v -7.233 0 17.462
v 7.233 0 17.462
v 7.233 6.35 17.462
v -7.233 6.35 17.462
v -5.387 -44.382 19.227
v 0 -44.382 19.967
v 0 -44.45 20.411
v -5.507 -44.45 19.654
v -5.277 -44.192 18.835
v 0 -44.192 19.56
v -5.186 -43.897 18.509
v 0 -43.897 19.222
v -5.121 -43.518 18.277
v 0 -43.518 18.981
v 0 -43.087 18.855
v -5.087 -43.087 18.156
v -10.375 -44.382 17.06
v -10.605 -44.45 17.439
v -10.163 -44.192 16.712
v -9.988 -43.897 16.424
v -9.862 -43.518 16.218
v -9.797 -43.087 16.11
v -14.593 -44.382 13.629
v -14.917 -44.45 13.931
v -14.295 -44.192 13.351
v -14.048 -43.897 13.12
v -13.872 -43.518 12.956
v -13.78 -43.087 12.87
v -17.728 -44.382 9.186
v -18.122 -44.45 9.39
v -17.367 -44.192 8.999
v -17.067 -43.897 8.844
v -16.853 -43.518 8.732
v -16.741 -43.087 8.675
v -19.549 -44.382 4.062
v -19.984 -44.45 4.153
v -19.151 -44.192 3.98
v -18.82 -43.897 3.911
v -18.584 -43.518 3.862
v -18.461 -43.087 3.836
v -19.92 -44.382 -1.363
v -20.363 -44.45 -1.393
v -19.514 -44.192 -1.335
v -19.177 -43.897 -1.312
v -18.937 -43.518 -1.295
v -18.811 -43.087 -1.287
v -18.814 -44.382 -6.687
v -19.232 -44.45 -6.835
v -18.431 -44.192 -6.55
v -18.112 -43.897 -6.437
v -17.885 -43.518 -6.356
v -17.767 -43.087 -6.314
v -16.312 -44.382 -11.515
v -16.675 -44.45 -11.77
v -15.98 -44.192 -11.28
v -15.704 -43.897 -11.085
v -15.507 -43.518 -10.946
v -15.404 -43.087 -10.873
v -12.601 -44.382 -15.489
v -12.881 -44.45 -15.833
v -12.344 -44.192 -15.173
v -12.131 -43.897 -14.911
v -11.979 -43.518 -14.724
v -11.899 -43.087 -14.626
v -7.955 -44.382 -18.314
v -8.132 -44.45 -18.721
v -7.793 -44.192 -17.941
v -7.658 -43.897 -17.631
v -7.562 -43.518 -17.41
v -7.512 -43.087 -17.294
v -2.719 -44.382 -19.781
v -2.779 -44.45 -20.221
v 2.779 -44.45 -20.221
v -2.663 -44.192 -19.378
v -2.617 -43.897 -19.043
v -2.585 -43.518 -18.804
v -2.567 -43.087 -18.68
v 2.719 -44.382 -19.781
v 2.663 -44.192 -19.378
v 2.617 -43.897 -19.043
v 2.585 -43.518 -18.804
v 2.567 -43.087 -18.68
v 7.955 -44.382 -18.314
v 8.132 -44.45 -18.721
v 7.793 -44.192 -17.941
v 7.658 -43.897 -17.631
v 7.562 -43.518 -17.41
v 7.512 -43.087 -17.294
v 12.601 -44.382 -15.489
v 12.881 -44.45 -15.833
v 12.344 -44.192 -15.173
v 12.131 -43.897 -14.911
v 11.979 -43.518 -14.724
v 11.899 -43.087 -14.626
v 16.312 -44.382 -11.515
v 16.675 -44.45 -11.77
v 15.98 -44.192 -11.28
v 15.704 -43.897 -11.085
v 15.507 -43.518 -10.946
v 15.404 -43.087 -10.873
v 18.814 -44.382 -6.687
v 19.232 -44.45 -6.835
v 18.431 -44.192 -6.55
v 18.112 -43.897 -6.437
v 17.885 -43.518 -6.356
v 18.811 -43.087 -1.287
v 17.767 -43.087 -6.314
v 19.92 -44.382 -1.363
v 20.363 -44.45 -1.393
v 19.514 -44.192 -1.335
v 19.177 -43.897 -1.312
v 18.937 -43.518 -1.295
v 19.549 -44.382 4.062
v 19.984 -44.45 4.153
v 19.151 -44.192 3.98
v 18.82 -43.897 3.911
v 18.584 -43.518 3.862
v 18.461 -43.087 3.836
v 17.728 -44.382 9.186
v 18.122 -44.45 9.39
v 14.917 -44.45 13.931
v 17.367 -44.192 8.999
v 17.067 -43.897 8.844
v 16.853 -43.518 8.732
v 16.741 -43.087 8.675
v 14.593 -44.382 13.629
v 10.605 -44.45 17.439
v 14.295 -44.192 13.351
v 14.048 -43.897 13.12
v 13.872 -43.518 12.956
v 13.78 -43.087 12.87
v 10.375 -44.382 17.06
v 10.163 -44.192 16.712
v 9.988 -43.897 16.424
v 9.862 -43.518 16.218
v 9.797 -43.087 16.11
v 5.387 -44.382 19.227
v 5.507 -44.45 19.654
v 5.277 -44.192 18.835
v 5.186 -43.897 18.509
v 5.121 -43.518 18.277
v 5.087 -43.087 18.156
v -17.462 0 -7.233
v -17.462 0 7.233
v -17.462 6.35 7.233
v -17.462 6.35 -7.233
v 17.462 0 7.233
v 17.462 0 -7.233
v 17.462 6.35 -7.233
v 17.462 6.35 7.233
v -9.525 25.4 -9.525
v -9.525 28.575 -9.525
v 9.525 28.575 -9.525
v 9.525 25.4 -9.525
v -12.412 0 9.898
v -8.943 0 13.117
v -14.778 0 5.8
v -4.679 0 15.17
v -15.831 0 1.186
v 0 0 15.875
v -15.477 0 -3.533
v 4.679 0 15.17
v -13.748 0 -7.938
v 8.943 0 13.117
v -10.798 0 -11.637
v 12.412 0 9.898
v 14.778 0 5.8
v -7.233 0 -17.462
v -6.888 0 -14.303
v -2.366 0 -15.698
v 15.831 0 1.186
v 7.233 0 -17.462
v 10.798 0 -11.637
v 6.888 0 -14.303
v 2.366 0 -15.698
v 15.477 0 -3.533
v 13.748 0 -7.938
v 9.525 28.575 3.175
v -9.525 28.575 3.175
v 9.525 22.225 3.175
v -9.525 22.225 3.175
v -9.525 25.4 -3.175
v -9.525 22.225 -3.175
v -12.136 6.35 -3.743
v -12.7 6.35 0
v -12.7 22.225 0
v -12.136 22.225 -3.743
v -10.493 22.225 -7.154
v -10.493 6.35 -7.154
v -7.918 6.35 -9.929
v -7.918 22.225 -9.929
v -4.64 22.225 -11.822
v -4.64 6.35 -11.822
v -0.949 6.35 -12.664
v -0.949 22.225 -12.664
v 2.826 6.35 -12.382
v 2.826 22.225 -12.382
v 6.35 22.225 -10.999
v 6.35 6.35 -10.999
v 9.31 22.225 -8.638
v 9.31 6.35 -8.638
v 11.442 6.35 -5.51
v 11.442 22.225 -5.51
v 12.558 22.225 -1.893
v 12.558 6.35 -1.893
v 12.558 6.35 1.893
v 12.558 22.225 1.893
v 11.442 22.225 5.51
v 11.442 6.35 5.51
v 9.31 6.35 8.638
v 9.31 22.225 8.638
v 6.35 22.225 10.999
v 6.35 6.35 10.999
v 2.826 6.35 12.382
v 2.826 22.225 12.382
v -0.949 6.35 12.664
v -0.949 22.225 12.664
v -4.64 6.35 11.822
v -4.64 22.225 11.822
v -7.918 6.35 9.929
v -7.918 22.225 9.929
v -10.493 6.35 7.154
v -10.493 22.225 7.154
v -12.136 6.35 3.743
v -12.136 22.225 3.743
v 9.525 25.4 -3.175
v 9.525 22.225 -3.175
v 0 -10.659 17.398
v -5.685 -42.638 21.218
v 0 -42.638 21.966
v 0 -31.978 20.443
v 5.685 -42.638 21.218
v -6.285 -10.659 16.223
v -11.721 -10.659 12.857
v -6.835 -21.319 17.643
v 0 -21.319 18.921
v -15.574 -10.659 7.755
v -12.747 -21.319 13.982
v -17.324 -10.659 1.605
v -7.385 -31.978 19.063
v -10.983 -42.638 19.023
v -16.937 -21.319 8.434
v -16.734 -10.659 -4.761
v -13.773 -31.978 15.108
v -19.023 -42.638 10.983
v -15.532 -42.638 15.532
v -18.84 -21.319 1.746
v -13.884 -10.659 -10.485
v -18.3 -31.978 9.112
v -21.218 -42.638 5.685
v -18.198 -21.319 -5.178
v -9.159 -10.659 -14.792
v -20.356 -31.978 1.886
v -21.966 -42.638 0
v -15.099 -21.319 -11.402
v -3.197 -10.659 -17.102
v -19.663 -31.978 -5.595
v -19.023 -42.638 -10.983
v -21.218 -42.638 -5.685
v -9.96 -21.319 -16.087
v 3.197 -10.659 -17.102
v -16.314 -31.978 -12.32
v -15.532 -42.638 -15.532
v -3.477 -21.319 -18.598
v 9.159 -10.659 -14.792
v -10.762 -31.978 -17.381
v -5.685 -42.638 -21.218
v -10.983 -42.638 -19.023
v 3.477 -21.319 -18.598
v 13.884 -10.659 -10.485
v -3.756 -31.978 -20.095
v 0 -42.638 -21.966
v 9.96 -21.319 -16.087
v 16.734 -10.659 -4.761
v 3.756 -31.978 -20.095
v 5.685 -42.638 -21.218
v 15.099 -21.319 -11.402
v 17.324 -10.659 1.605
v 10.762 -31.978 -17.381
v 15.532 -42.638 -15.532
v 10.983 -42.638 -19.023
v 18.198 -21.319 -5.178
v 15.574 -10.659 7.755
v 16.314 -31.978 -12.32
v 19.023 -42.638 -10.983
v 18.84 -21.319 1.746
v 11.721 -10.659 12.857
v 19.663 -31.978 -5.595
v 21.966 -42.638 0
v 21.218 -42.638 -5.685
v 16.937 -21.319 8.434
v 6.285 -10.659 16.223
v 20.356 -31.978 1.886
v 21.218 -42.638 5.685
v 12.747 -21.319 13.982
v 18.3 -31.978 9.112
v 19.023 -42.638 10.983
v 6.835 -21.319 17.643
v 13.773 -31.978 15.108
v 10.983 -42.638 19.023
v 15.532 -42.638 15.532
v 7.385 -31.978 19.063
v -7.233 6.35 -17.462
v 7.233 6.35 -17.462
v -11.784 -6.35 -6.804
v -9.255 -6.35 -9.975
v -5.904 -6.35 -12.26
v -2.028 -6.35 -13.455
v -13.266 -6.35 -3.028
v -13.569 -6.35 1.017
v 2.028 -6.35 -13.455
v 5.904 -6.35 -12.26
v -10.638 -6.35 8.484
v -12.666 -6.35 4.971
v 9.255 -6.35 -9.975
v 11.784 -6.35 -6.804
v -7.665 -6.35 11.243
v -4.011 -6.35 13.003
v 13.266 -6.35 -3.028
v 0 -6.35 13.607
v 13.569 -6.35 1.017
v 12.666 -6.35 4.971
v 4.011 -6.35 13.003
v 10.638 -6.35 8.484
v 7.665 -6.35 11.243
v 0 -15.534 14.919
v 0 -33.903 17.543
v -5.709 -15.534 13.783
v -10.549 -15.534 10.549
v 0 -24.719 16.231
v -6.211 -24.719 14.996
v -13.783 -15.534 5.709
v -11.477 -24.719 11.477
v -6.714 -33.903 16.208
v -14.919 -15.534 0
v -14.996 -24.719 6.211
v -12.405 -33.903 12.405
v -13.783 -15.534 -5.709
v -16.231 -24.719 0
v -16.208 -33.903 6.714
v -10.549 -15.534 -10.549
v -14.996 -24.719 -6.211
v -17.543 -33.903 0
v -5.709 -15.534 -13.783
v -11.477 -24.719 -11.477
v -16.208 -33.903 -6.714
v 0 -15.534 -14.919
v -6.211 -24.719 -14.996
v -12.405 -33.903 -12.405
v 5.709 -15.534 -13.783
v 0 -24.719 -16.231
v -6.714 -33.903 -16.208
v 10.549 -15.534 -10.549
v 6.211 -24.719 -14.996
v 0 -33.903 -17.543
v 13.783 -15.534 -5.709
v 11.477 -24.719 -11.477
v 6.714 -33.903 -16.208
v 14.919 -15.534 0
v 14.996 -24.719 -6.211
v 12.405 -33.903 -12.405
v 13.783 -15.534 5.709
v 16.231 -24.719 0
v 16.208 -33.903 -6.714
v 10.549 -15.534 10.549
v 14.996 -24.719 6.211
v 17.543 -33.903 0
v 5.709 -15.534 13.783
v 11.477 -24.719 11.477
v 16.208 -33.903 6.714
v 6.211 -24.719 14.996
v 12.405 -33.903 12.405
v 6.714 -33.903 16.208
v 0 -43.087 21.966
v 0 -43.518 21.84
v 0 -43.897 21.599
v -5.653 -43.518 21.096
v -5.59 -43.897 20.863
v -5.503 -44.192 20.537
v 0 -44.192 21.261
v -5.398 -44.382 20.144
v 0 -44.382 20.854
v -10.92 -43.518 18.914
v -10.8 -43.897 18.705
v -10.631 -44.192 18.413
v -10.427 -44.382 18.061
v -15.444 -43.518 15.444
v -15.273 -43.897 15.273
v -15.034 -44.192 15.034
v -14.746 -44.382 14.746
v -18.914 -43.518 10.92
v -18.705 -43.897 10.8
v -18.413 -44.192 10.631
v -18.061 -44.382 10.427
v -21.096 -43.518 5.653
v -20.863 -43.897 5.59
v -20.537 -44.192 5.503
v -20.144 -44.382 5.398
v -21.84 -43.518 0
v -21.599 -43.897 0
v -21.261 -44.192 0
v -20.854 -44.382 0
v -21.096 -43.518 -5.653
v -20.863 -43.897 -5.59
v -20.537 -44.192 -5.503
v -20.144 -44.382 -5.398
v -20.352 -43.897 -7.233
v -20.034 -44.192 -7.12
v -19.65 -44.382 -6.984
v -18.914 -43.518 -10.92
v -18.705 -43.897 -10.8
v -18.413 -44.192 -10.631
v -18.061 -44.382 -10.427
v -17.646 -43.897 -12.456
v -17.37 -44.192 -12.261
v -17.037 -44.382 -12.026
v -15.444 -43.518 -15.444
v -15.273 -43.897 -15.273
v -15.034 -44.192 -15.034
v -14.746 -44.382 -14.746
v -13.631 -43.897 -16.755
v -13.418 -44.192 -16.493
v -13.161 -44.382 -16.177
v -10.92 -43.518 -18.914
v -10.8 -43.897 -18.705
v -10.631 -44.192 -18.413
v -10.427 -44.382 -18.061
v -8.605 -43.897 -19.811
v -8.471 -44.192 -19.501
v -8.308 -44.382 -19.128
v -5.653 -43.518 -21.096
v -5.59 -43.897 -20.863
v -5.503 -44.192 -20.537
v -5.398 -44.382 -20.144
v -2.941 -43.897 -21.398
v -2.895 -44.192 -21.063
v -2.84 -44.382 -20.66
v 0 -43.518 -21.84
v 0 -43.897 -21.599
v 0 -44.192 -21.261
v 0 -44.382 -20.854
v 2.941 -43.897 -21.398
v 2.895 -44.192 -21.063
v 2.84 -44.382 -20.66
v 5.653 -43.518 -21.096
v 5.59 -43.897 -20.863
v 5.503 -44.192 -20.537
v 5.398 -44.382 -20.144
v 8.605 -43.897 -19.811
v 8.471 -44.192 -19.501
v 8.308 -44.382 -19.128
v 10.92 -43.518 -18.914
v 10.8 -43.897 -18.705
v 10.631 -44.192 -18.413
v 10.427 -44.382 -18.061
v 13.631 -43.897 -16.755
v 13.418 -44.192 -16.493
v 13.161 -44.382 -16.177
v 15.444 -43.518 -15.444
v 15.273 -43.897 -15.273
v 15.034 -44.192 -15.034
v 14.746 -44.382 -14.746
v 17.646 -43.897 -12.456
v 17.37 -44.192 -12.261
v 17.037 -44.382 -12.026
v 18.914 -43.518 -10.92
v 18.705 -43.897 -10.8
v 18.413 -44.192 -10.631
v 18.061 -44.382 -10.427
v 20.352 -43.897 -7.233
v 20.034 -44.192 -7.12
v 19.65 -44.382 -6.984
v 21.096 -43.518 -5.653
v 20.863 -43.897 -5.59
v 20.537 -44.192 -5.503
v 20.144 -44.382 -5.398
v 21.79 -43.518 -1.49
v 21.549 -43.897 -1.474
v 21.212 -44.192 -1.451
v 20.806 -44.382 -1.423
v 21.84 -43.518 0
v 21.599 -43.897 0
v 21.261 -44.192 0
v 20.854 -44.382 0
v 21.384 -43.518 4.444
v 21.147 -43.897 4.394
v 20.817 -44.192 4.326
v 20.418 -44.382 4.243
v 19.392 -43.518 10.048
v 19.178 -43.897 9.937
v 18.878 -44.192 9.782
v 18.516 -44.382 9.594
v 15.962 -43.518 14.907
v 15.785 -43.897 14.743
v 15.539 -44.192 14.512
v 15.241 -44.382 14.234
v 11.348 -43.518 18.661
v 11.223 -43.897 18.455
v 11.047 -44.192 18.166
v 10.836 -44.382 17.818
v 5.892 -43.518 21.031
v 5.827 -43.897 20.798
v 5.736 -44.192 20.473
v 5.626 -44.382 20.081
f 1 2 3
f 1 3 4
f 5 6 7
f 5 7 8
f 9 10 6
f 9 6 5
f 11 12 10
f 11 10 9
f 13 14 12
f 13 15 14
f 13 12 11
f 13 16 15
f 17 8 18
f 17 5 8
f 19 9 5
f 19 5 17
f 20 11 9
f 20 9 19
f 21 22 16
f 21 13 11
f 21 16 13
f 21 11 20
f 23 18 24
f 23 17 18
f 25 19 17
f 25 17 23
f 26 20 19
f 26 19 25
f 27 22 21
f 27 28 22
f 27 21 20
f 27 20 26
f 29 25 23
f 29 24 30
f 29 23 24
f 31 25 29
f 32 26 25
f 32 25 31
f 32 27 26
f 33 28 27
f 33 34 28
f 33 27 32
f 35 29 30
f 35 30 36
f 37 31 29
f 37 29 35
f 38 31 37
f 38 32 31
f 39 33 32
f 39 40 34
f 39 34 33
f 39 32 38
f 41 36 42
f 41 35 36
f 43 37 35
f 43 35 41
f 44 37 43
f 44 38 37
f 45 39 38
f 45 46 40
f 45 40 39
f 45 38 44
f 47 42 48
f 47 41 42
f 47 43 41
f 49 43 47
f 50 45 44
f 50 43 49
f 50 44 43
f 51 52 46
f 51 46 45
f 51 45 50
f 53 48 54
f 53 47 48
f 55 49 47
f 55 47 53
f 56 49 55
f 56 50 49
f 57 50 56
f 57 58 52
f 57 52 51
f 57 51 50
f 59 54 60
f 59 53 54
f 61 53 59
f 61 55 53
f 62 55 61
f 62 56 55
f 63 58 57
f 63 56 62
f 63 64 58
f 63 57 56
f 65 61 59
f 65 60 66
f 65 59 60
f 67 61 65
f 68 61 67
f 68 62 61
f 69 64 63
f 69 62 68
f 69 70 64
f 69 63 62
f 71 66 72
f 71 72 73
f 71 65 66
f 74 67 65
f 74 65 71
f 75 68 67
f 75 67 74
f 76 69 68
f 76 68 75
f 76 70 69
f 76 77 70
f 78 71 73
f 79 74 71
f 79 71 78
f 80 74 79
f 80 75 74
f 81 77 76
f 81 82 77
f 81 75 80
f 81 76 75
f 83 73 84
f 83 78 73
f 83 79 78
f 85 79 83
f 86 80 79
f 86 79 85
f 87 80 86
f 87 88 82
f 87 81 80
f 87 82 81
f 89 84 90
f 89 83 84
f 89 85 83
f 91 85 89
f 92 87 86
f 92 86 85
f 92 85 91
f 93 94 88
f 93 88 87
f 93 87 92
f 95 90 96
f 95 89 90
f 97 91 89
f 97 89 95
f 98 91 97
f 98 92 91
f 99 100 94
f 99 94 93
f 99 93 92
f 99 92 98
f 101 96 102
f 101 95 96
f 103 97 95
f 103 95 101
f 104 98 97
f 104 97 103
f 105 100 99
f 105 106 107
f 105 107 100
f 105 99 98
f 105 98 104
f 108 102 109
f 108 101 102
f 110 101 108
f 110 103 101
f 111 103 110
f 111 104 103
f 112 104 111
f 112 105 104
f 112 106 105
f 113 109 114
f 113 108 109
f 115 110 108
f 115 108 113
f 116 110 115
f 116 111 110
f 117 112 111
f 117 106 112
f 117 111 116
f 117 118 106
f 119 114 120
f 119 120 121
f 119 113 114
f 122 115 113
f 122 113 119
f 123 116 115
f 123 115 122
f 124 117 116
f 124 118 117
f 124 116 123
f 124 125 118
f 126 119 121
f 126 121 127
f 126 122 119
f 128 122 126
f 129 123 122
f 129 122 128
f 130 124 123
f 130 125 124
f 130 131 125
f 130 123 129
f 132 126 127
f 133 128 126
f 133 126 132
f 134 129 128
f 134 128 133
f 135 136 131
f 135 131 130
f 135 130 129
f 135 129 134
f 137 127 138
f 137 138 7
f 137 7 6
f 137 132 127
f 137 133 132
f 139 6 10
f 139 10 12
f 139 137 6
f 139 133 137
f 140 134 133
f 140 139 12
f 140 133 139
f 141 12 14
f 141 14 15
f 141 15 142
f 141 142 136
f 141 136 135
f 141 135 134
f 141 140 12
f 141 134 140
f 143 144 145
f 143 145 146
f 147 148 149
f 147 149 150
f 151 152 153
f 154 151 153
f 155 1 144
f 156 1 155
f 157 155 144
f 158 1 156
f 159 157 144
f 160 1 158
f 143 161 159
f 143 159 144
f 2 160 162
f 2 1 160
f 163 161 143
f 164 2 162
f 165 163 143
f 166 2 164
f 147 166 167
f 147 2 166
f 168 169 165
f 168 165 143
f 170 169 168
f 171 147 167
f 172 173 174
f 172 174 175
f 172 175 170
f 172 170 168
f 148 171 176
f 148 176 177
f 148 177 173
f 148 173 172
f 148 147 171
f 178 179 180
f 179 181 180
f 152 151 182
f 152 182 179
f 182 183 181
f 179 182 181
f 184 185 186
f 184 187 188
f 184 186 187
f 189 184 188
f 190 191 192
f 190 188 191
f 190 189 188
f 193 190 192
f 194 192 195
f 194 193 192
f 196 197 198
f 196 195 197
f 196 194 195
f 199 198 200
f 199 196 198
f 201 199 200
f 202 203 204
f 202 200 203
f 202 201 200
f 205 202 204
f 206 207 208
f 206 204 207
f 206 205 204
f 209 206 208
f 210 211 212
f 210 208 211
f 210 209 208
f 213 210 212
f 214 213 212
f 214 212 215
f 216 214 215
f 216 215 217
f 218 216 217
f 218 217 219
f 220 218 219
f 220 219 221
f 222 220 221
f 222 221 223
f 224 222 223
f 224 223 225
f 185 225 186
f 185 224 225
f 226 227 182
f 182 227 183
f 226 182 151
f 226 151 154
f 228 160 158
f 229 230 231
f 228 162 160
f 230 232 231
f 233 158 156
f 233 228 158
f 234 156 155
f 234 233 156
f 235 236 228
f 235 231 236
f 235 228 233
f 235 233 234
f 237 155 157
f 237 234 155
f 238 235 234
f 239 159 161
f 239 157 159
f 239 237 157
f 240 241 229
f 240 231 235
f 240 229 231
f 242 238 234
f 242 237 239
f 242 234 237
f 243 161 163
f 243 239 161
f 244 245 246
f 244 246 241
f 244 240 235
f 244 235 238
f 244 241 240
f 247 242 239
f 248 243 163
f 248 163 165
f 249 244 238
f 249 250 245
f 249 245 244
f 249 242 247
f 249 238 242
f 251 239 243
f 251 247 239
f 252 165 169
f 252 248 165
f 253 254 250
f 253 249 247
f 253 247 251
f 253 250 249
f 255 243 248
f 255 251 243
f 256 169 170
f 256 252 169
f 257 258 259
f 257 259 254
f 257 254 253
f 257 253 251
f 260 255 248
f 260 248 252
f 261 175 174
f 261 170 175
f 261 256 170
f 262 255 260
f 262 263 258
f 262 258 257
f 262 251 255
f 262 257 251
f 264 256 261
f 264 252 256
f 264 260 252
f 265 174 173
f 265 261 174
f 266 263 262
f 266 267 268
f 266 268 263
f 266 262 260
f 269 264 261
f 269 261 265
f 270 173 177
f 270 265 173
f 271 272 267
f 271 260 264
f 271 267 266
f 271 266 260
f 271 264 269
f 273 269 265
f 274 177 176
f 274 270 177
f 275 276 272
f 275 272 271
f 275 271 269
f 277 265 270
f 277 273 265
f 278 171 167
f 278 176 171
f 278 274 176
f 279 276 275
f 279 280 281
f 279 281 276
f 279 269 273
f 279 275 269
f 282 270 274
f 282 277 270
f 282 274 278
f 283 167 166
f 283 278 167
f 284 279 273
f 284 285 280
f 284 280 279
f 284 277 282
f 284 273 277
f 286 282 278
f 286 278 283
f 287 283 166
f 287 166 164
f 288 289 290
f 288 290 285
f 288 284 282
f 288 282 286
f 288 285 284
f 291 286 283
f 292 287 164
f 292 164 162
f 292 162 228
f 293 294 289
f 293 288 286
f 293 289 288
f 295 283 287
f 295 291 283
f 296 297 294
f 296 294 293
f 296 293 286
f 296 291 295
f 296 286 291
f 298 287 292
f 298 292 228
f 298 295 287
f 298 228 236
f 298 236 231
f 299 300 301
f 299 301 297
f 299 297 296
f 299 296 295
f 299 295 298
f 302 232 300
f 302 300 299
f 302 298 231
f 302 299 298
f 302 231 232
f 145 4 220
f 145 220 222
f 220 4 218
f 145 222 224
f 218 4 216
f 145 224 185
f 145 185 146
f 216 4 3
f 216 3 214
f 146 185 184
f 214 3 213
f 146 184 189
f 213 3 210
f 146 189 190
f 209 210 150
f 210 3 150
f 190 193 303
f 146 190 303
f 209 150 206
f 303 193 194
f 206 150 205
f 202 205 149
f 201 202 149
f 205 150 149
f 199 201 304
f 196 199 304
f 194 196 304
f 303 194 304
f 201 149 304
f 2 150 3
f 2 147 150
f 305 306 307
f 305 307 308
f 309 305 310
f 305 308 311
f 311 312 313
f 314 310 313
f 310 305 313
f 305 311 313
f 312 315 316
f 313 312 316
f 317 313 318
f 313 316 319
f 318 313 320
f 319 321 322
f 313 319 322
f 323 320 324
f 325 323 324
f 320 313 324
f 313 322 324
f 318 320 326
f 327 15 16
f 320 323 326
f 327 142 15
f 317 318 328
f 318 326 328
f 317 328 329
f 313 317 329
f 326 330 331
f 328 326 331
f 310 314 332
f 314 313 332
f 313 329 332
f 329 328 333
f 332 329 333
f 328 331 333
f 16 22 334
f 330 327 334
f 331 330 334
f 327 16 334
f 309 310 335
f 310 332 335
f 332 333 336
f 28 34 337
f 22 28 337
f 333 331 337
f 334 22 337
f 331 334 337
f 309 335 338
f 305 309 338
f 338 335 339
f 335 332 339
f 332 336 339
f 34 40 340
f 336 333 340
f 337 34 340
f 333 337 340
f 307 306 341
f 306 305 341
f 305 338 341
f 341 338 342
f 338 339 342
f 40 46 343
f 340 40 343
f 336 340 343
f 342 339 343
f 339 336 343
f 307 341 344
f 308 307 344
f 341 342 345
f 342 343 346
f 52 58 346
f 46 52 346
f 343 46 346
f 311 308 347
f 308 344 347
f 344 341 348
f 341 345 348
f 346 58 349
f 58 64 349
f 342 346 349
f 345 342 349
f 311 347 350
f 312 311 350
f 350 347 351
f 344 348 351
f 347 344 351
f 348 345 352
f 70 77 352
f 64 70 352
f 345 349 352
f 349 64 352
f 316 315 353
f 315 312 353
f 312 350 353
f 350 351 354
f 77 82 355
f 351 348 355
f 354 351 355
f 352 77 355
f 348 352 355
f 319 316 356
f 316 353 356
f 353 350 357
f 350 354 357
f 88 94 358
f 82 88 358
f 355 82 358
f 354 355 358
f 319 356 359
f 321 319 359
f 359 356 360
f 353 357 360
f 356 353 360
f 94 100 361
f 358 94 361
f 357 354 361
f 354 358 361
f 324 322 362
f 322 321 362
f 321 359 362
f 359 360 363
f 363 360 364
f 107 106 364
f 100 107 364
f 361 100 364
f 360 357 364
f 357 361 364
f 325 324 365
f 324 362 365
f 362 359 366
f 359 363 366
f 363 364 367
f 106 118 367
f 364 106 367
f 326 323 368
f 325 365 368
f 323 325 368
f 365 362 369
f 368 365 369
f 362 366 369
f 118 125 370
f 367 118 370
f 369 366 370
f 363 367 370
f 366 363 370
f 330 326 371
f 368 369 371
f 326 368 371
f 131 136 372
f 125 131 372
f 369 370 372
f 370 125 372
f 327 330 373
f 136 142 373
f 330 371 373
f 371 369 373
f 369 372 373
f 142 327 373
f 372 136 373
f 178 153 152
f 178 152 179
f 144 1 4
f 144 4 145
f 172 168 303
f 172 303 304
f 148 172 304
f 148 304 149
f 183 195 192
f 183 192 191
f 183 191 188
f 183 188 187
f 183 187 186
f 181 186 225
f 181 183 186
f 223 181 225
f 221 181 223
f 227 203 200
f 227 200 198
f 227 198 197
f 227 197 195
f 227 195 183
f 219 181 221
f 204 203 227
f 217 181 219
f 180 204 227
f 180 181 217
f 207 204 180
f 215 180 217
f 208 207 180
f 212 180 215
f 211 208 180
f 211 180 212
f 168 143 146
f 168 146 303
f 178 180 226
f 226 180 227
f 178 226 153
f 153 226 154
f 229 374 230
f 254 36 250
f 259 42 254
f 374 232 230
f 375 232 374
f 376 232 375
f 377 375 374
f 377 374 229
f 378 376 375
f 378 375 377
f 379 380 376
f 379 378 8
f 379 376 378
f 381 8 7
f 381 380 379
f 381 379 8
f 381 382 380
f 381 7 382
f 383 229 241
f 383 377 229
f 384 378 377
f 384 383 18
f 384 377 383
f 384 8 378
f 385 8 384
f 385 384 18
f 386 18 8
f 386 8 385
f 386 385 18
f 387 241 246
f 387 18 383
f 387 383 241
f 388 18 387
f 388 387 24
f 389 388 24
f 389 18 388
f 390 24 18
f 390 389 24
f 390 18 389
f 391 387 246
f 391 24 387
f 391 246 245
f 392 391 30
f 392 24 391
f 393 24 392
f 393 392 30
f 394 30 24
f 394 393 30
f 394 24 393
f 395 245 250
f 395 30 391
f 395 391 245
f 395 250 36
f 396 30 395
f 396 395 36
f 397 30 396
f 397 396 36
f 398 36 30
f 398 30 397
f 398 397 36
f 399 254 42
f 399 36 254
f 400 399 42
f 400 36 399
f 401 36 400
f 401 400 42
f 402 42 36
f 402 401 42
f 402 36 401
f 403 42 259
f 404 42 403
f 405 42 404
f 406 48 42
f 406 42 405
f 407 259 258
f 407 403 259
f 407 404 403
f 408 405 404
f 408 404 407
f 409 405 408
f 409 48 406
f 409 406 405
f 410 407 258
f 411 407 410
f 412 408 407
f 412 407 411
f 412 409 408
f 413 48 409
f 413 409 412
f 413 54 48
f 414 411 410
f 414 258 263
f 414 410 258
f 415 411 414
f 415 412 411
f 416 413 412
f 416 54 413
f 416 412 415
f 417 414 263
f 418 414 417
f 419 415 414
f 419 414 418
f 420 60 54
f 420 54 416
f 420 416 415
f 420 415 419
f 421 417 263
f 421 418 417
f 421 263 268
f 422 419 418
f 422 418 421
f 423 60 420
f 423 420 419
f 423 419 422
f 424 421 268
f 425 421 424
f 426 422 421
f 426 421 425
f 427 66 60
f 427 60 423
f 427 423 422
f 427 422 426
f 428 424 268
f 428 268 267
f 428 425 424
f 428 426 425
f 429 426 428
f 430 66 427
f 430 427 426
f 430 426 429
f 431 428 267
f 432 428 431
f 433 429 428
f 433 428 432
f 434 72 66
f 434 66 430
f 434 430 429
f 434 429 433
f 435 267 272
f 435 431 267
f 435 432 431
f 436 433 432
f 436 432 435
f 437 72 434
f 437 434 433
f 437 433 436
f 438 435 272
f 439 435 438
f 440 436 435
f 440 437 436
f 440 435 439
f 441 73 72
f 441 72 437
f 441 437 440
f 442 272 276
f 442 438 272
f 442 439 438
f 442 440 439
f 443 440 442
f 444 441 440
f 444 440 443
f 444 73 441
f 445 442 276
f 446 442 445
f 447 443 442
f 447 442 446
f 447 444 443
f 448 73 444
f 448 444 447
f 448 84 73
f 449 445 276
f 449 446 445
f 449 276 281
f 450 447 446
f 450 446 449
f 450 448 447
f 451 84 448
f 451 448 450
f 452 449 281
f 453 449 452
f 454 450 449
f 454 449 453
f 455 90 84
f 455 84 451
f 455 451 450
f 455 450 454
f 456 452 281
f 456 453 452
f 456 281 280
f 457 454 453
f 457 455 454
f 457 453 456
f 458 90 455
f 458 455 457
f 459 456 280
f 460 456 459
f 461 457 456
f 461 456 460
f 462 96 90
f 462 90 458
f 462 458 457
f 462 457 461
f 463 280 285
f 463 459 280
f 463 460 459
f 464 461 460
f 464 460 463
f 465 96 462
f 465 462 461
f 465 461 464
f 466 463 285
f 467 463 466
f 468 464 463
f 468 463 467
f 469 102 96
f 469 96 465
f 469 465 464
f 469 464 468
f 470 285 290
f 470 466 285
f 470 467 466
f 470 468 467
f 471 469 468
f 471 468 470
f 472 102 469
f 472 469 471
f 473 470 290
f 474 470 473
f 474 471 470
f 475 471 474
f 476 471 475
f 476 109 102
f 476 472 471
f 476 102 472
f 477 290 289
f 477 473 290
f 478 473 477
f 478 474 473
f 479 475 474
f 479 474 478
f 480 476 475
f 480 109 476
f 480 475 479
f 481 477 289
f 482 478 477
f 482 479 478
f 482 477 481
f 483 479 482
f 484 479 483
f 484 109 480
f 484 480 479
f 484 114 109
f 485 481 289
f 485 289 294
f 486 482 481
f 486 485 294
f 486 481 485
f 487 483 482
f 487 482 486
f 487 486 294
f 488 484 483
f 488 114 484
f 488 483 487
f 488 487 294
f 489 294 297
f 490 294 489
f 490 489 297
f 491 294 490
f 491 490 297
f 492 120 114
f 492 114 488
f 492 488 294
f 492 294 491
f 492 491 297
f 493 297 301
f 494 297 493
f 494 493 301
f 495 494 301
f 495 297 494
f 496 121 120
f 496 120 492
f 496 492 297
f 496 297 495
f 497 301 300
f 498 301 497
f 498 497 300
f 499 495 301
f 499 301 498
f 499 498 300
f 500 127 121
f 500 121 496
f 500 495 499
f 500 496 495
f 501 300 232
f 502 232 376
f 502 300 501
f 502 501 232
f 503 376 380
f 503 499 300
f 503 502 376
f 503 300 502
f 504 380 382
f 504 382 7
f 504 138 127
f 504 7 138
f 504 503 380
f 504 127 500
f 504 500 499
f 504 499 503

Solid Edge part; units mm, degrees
sketch "Sketch1" plane through (0, 0, 0) normal (0, -1, 0) x (1, 0, 0)
  line L0 (17.4625, 7.2332) -> (7.2332, 17.4625)
  line L1 (7.2332, 17.4625) -> (-7.2332, 17.4625)
  line L2 (-7.2332, 17.4625) -> (-17.4625, 7.2332)
  line L3 (-17.4625, 7.2332) -> (-17.4625, -7.2332)
  line L4 (-17.4625, -7.2332) -> (-7.2332, -17.4625)
  line L5 (-7.2332, -17.4625) -> (7.2332, -17.4625)
  line L6 (7.2332, -17.4625) -> (17.4625, -7.2332)
  line L7 (17.4625, -7.2332) -> (17.4625, 7.2332)
  dimension "D1" = 34.925
extrude "Protrusion1" add sketch "Sketch1" against normal blind 6.35
sketch "Sketch2" plane through (0, 6.35, 0) normal (0, 1, 0) x (-1, 0, 0)
  circle A0 centre (0, 0) radius 12.7
extrude "ExtrudedProtrusion_2" add sketch "Sketch2" along normal blind 15.875
sketch "Sketch3" plane through (0, 0, 0) normal (-1, 0, 0) x (0, -1, 0)
  line L0 (44.45, 19.05) -> (44.45, 22.225)
  line L1 (0, 15.875) -> (44.45, 22.225)
  line L2 (0, 0) -> (0, 15.875)
  line L3 (6.35, 0) -> (0, 0)
  line L4 (6.35, 0) -> (6.35, 13.6071)
  line L5 (6.35, 13.6071) -> (44.45, 19.05)
revolve "RevolvedProtrusion1" add sketch "Sketch3" angle 360 about axis through (0, -44.45, 0) along (0, 1, 0)
fillet "Round_1" radius 1.5875 2 edges at (0, -44.45, -22.225) (0, -44.45, -19.05)
cosmetic_thread "Thread1" size "1-8 UNC"
sketch "Sketch4" plane through (0, 22.225, 0) normal (0, 1, 0) x (-1, 0, 0)
  line L0 (-9.525, -3.175) -> (9.525, -3.175)
  line L1 (9.525, -3.175) -> (9.525, 3.175)
  line L2 (9.525, 3.175) -> (-9.525, 3.175)
  line L3 (-9.525, 3.175) -> (-9.525, -3.175)
  dimension "D1" = 19.05
  dimension "D2" = 6.35
extrude "ExtrudedProtrusion_3" add sketch "Sketch4" along normal blind 6.35
sketch "Sketch5" plane through (0, 25.4, -3.175) normal (0, 0, -1) x (0, -1, 0)
  line L0 (-3.175, 9.525) -> (0, 9.525)
  line L1 (0, 9.525) -> (0, -9.525)
  line L2 (0, -9.525) -> (-3.175, -9.525)
  line L3 (-3.175, -9.525) -> (-3.175, 9.525)
extrude "ExtrudedProtrusion_4" add sketch "Sketch5" along normal blind 6.35
properties material "ABS Plastic, high impact"
